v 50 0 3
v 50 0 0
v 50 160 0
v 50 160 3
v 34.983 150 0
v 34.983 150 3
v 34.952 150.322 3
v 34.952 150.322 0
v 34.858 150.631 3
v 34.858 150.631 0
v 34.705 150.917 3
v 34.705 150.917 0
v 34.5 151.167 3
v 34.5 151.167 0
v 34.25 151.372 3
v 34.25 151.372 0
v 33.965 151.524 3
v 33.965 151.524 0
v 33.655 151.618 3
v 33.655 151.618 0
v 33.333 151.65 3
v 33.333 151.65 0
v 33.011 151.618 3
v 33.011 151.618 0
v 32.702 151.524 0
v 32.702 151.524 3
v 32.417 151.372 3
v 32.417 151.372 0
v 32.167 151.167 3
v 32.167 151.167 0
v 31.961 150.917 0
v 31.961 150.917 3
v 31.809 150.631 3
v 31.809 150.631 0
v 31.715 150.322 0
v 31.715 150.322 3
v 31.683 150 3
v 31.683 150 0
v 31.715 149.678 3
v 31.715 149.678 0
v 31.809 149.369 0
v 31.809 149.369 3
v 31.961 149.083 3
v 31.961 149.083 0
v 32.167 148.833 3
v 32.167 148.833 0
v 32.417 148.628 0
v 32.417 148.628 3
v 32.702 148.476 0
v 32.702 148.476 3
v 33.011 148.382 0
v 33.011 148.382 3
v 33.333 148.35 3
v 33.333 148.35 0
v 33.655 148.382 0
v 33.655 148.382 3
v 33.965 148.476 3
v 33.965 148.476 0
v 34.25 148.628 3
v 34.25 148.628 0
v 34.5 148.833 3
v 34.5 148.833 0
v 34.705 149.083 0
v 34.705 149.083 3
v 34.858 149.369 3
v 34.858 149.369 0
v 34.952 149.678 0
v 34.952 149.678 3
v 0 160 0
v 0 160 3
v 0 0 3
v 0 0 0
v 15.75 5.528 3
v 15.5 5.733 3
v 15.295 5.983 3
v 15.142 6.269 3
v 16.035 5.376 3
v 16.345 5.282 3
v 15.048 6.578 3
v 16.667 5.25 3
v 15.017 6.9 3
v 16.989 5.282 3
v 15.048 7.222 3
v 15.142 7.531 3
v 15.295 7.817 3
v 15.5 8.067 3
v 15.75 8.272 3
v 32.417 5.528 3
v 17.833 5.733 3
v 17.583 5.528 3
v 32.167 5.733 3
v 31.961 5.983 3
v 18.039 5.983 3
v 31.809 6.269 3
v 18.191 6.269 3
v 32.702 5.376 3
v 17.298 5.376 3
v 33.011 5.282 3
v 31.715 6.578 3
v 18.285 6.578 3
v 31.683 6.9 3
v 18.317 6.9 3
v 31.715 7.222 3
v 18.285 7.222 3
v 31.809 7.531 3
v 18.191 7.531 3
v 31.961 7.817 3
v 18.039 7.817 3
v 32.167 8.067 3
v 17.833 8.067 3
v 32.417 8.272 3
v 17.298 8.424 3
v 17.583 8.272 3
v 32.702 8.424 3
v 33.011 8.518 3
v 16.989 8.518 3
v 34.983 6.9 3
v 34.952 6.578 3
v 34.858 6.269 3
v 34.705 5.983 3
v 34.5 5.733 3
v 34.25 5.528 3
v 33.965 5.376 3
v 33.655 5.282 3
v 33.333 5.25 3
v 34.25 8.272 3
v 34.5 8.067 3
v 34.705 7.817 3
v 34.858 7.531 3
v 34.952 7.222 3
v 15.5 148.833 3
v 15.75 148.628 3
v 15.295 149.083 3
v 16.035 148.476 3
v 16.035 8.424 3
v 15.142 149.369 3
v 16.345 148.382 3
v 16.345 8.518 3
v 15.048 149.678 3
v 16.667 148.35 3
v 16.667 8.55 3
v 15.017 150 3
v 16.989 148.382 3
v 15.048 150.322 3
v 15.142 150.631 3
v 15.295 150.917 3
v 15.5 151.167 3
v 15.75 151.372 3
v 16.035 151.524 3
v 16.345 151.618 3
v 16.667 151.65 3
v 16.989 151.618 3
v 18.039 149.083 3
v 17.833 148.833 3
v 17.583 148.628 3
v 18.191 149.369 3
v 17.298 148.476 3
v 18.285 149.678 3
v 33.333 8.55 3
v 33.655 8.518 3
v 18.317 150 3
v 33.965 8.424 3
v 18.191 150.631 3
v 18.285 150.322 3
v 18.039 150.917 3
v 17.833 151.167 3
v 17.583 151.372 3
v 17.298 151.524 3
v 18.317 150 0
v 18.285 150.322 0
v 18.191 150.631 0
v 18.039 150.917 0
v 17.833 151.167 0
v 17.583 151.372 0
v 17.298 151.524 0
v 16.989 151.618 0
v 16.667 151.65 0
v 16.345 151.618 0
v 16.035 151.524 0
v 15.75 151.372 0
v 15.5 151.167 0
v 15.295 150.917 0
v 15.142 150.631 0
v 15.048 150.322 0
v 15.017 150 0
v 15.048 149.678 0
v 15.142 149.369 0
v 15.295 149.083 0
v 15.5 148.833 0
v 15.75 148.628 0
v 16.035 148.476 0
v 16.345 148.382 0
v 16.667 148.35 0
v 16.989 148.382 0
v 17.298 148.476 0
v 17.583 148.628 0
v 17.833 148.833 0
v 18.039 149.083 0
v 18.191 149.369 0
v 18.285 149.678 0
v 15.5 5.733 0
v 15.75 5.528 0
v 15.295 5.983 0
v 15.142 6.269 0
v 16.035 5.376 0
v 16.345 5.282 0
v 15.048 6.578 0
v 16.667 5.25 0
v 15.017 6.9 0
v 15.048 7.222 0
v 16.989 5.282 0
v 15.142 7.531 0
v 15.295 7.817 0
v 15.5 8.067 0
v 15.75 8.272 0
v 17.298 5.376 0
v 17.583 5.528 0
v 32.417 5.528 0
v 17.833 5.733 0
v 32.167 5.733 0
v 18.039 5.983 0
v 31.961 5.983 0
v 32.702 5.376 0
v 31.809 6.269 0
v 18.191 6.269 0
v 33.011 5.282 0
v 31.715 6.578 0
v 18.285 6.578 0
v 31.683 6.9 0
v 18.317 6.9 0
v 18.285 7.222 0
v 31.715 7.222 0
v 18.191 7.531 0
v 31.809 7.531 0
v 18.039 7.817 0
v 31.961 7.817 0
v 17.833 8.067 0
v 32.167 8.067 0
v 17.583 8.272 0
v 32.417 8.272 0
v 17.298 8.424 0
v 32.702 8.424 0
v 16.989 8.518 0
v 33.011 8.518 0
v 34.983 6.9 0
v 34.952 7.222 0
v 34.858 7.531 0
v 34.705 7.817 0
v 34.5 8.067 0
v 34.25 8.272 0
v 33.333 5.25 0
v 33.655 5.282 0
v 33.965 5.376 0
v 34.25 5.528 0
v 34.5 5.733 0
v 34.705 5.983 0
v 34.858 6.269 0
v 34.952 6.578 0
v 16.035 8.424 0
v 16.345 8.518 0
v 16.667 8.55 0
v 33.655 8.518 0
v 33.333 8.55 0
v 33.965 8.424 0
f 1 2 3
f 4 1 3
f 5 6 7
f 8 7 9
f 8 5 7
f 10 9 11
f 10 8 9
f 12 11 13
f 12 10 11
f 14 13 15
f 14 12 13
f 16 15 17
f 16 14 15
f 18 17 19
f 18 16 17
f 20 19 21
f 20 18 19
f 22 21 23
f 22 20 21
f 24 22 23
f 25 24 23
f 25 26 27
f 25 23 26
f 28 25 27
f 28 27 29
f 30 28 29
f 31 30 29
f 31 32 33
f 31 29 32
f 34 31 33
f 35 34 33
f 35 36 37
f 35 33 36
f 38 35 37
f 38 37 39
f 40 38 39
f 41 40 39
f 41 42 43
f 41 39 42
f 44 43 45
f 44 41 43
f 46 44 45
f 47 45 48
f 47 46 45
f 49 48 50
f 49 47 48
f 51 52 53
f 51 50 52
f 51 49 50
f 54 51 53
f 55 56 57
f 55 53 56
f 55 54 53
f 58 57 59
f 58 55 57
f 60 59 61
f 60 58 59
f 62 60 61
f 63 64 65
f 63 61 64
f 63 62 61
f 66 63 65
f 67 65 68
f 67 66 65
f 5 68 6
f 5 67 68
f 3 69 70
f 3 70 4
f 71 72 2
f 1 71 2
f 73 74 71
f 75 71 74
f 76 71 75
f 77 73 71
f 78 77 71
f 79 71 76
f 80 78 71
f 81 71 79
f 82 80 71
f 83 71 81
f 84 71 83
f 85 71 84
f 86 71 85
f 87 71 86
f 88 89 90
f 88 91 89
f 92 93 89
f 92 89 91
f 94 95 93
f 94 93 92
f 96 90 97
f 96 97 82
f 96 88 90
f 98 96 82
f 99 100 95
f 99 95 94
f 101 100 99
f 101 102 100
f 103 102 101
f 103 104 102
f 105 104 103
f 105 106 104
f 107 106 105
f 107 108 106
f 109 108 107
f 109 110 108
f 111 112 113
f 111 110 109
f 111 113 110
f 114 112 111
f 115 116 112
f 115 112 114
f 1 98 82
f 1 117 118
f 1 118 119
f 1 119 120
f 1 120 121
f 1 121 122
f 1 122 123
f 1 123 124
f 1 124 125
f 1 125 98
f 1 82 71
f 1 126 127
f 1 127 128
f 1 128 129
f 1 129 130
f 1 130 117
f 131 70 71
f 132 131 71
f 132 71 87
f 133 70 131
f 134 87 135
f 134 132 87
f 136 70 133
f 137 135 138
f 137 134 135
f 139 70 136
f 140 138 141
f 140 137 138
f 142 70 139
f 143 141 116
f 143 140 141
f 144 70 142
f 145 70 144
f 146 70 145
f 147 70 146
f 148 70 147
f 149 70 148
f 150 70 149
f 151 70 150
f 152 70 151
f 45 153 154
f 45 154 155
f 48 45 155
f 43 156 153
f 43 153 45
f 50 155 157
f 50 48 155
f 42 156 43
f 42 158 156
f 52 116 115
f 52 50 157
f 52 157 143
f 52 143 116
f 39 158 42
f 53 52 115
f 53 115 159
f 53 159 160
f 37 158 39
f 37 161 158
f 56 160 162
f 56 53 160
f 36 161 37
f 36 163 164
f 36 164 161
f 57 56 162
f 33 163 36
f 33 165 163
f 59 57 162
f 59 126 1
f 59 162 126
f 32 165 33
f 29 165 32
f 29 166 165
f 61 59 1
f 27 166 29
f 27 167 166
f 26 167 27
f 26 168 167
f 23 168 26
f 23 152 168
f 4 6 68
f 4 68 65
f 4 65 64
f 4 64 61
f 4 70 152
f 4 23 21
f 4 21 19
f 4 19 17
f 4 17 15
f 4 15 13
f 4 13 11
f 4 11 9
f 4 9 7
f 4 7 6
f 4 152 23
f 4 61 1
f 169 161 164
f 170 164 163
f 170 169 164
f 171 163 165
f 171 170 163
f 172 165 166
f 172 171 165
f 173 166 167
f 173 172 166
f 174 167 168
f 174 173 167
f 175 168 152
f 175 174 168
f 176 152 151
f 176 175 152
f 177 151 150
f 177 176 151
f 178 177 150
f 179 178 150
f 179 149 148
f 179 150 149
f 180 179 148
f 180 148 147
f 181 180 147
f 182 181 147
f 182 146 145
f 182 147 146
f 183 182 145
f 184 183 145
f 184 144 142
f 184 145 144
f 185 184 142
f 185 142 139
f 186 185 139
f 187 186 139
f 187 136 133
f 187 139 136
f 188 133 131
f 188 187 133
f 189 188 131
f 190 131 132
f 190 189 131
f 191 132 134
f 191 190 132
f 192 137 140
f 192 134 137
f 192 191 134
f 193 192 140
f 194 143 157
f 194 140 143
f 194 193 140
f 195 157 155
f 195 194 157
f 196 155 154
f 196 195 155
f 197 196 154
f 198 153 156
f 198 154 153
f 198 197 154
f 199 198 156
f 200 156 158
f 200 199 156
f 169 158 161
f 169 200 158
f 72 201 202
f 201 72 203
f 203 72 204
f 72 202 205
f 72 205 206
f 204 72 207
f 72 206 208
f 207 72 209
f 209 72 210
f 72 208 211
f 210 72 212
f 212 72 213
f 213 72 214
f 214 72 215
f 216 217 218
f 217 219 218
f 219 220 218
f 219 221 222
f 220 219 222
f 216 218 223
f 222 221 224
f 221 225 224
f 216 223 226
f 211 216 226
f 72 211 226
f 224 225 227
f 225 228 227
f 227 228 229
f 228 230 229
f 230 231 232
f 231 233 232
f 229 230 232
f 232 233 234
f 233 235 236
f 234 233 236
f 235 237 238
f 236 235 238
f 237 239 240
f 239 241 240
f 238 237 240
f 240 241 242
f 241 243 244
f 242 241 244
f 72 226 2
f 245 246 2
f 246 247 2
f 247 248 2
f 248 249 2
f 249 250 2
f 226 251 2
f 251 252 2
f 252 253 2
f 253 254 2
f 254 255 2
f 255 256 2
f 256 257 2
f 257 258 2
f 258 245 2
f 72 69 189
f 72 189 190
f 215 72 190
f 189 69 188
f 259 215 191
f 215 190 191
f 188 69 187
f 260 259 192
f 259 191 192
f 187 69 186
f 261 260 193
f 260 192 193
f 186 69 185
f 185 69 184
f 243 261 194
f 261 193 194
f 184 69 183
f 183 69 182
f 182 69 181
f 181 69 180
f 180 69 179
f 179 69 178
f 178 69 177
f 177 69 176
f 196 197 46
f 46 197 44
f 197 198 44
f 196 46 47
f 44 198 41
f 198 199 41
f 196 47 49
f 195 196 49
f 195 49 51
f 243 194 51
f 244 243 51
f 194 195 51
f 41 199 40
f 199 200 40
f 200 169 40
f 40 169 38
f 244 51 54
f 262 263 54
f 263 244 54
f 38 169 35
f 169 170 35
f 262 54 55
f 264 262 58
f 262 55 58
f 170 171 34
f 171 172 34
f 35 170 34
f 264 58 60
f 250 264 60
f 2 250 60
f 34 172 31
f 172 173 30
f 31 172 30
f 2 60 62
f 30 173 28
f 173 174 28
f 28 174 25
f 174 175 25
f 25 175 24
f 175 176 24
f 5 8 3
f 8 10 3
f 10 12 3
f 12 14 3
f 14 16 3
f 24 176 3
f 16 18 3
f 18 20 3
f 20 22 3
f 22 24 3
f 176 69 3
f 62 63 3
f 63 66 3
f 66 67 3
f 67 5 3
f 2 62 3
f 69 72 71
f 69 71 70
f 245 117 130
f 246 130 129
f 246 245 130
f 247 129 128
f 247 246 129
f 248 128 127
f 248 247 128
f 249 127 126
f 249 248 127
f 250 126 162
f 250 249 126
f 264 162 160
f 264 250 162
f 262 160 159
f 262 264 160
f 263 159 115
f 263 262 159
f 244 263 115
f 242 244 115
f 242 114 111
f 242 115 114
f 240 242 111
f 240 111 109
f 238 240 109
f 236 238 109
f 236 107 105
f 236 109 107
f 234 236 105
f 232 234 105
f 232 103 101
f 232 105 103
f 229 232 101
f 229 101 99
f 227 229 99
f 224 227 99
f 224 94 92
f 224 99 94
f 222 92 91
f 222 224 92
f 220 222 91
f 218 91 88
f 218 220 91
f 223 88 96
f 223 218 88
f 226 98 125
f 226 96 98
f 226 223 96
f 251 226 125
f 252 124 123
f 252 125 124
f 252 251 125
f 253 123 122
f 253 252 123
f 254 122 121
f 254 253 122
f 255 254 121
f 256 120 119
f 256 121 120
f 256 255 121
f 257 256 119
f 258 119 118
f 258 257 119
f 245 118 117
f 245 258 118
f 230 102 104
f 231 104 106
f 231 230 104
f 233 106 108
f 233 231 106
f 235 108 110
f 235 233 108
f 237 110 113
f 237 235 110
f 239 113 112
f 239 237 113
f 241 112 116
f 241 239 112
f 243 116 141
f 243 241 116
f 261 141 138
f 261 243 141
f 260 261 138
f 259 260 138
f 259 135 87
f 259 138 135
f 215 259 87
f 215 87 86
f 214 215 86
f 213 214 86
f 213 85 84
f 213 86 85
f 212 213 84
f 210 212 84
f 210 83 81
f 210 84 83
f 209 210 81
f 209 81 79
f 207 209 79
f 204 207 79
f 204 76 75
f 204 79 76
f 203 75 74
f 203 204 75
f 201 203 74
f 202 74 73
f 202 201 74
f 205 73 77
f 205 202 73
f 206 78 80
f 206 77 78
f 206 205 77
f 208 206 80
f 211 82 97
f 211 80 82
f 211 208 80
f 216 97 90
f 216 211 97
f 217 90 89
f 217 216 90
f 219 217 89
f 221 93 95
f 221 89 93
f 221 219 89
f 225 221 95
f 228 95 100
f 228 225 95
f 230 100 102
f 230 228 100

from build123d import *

# Parameters (mm, degrees)
SKETCH001_W          = 50
SKETCH001_H          = 16.9
PAD_DEPTH            = 3
SKETCH002_W          = 50
SKETCH002_H          = 50
PAD001_DEPTH         = 3
SKETCH003_W          = 50
SKETCH003_H          = 20
PAD002_DEPTH         = 3
SKETCH004_W          = 50
SKETCH004_H          = 53.1
PAD003_DEPTH         = 3
SKETCH005_W          = 50
SKETCH005_H          = 20
PAD004_DEPTH         = 3
SKETCH006_R          = 1.65
POCKET_DEPTH         = 3.001
SKETCH_R             = 1.65
POCKET001_DEPTH      = 0.001
POCKET001_DEPTH_BACK = 3.001


with BuildPart() as part:
    # Sketch001 → Pad (new body)
    with BuildSketch(Plane.XY):
        with Locations((25, 8.45)):
            Rectangle(SKETCH001_W, SKETCH001_H)
    extrude(amount=PAD_DEPTH)

    # Sketch002 → Pad001 (join)
    with BuildSketch(Plane(origin=(0, 16.9, 0), x_dir=(1, 0, 0), z_dir=(0, 0, 1))):
        with Locations((25, 25)):
            Rectangle(SKETCH002_W, SKETCH002_H)
    extrude(amount=PAD001_DEPTH)

    # Sketch003 → Pad002 (join)
    with BuildSketch(Plane(origin=(0, 66.9, 0), x_dir=(1, 0, 0), z_dir=(0, 0, 1))):
        with Locations((25, 10)):
            Rectangle(SKETCH003_W, SKETCH003_H)
    extrude(amount=PAD002_DEPTH)

    # Sketch004 → Pad003 (join)
    with BuildSketch(Plane(origin=(0, 86.9, 0), x_dir=(1, 0, 0), z_dir=(0, 0, 1))):
        with Locations((25, 26.55)):
            Rectangle(SKETCH004_W, SKETCH004_H)
    extrude(amount=PAD003_DEPTH)

    # Sketch005 → Pad004 (join)
    with BuildSketch(Plane(origin=(0, 140, 0), x_dir=(1, 0, 0), z_dir=(0, 0, 1))):
        with Locations((25, 10)):
            Rectangle(SKETCH005_W, SKETCH005_H)
    extrude(amount=PAD004_DEPTH)

    # Sketch006 → Pocket (cut, through all)
    with BuildSketch(Plane.XY):
        with Locations((16.666667, 6.9)):
            Circle(SKETCH006_R)
        with Locations((33.333333, 6.9)):
            Circle(SKETCH006_R)
    extrude(amount=POCKET_DEPTH, mode=Mode.SUBTRACT)

    # Sketch → Pocket001 (cut, two sides)
    with BuildSketch(Plane(origin=(0, 140, 0), x_dir=(1, 0, 0), z_dir=(0, 0, 1))) as pocket001_sk:
        with Locations((16.666667, 10)):
            Circle(SKETCH_R)
        with Locations((33.333333, 10)):
            Circle(SKETCH_R)
    extrude(amount=-POCKET001_DEPTH, mode=Mode.SUBTRACT)
    extrude(pocket001_sk.sketch, amount=POCKET001_DEPTH_BACK, mode=Mode.SUBTRACT)


solid = part.part
